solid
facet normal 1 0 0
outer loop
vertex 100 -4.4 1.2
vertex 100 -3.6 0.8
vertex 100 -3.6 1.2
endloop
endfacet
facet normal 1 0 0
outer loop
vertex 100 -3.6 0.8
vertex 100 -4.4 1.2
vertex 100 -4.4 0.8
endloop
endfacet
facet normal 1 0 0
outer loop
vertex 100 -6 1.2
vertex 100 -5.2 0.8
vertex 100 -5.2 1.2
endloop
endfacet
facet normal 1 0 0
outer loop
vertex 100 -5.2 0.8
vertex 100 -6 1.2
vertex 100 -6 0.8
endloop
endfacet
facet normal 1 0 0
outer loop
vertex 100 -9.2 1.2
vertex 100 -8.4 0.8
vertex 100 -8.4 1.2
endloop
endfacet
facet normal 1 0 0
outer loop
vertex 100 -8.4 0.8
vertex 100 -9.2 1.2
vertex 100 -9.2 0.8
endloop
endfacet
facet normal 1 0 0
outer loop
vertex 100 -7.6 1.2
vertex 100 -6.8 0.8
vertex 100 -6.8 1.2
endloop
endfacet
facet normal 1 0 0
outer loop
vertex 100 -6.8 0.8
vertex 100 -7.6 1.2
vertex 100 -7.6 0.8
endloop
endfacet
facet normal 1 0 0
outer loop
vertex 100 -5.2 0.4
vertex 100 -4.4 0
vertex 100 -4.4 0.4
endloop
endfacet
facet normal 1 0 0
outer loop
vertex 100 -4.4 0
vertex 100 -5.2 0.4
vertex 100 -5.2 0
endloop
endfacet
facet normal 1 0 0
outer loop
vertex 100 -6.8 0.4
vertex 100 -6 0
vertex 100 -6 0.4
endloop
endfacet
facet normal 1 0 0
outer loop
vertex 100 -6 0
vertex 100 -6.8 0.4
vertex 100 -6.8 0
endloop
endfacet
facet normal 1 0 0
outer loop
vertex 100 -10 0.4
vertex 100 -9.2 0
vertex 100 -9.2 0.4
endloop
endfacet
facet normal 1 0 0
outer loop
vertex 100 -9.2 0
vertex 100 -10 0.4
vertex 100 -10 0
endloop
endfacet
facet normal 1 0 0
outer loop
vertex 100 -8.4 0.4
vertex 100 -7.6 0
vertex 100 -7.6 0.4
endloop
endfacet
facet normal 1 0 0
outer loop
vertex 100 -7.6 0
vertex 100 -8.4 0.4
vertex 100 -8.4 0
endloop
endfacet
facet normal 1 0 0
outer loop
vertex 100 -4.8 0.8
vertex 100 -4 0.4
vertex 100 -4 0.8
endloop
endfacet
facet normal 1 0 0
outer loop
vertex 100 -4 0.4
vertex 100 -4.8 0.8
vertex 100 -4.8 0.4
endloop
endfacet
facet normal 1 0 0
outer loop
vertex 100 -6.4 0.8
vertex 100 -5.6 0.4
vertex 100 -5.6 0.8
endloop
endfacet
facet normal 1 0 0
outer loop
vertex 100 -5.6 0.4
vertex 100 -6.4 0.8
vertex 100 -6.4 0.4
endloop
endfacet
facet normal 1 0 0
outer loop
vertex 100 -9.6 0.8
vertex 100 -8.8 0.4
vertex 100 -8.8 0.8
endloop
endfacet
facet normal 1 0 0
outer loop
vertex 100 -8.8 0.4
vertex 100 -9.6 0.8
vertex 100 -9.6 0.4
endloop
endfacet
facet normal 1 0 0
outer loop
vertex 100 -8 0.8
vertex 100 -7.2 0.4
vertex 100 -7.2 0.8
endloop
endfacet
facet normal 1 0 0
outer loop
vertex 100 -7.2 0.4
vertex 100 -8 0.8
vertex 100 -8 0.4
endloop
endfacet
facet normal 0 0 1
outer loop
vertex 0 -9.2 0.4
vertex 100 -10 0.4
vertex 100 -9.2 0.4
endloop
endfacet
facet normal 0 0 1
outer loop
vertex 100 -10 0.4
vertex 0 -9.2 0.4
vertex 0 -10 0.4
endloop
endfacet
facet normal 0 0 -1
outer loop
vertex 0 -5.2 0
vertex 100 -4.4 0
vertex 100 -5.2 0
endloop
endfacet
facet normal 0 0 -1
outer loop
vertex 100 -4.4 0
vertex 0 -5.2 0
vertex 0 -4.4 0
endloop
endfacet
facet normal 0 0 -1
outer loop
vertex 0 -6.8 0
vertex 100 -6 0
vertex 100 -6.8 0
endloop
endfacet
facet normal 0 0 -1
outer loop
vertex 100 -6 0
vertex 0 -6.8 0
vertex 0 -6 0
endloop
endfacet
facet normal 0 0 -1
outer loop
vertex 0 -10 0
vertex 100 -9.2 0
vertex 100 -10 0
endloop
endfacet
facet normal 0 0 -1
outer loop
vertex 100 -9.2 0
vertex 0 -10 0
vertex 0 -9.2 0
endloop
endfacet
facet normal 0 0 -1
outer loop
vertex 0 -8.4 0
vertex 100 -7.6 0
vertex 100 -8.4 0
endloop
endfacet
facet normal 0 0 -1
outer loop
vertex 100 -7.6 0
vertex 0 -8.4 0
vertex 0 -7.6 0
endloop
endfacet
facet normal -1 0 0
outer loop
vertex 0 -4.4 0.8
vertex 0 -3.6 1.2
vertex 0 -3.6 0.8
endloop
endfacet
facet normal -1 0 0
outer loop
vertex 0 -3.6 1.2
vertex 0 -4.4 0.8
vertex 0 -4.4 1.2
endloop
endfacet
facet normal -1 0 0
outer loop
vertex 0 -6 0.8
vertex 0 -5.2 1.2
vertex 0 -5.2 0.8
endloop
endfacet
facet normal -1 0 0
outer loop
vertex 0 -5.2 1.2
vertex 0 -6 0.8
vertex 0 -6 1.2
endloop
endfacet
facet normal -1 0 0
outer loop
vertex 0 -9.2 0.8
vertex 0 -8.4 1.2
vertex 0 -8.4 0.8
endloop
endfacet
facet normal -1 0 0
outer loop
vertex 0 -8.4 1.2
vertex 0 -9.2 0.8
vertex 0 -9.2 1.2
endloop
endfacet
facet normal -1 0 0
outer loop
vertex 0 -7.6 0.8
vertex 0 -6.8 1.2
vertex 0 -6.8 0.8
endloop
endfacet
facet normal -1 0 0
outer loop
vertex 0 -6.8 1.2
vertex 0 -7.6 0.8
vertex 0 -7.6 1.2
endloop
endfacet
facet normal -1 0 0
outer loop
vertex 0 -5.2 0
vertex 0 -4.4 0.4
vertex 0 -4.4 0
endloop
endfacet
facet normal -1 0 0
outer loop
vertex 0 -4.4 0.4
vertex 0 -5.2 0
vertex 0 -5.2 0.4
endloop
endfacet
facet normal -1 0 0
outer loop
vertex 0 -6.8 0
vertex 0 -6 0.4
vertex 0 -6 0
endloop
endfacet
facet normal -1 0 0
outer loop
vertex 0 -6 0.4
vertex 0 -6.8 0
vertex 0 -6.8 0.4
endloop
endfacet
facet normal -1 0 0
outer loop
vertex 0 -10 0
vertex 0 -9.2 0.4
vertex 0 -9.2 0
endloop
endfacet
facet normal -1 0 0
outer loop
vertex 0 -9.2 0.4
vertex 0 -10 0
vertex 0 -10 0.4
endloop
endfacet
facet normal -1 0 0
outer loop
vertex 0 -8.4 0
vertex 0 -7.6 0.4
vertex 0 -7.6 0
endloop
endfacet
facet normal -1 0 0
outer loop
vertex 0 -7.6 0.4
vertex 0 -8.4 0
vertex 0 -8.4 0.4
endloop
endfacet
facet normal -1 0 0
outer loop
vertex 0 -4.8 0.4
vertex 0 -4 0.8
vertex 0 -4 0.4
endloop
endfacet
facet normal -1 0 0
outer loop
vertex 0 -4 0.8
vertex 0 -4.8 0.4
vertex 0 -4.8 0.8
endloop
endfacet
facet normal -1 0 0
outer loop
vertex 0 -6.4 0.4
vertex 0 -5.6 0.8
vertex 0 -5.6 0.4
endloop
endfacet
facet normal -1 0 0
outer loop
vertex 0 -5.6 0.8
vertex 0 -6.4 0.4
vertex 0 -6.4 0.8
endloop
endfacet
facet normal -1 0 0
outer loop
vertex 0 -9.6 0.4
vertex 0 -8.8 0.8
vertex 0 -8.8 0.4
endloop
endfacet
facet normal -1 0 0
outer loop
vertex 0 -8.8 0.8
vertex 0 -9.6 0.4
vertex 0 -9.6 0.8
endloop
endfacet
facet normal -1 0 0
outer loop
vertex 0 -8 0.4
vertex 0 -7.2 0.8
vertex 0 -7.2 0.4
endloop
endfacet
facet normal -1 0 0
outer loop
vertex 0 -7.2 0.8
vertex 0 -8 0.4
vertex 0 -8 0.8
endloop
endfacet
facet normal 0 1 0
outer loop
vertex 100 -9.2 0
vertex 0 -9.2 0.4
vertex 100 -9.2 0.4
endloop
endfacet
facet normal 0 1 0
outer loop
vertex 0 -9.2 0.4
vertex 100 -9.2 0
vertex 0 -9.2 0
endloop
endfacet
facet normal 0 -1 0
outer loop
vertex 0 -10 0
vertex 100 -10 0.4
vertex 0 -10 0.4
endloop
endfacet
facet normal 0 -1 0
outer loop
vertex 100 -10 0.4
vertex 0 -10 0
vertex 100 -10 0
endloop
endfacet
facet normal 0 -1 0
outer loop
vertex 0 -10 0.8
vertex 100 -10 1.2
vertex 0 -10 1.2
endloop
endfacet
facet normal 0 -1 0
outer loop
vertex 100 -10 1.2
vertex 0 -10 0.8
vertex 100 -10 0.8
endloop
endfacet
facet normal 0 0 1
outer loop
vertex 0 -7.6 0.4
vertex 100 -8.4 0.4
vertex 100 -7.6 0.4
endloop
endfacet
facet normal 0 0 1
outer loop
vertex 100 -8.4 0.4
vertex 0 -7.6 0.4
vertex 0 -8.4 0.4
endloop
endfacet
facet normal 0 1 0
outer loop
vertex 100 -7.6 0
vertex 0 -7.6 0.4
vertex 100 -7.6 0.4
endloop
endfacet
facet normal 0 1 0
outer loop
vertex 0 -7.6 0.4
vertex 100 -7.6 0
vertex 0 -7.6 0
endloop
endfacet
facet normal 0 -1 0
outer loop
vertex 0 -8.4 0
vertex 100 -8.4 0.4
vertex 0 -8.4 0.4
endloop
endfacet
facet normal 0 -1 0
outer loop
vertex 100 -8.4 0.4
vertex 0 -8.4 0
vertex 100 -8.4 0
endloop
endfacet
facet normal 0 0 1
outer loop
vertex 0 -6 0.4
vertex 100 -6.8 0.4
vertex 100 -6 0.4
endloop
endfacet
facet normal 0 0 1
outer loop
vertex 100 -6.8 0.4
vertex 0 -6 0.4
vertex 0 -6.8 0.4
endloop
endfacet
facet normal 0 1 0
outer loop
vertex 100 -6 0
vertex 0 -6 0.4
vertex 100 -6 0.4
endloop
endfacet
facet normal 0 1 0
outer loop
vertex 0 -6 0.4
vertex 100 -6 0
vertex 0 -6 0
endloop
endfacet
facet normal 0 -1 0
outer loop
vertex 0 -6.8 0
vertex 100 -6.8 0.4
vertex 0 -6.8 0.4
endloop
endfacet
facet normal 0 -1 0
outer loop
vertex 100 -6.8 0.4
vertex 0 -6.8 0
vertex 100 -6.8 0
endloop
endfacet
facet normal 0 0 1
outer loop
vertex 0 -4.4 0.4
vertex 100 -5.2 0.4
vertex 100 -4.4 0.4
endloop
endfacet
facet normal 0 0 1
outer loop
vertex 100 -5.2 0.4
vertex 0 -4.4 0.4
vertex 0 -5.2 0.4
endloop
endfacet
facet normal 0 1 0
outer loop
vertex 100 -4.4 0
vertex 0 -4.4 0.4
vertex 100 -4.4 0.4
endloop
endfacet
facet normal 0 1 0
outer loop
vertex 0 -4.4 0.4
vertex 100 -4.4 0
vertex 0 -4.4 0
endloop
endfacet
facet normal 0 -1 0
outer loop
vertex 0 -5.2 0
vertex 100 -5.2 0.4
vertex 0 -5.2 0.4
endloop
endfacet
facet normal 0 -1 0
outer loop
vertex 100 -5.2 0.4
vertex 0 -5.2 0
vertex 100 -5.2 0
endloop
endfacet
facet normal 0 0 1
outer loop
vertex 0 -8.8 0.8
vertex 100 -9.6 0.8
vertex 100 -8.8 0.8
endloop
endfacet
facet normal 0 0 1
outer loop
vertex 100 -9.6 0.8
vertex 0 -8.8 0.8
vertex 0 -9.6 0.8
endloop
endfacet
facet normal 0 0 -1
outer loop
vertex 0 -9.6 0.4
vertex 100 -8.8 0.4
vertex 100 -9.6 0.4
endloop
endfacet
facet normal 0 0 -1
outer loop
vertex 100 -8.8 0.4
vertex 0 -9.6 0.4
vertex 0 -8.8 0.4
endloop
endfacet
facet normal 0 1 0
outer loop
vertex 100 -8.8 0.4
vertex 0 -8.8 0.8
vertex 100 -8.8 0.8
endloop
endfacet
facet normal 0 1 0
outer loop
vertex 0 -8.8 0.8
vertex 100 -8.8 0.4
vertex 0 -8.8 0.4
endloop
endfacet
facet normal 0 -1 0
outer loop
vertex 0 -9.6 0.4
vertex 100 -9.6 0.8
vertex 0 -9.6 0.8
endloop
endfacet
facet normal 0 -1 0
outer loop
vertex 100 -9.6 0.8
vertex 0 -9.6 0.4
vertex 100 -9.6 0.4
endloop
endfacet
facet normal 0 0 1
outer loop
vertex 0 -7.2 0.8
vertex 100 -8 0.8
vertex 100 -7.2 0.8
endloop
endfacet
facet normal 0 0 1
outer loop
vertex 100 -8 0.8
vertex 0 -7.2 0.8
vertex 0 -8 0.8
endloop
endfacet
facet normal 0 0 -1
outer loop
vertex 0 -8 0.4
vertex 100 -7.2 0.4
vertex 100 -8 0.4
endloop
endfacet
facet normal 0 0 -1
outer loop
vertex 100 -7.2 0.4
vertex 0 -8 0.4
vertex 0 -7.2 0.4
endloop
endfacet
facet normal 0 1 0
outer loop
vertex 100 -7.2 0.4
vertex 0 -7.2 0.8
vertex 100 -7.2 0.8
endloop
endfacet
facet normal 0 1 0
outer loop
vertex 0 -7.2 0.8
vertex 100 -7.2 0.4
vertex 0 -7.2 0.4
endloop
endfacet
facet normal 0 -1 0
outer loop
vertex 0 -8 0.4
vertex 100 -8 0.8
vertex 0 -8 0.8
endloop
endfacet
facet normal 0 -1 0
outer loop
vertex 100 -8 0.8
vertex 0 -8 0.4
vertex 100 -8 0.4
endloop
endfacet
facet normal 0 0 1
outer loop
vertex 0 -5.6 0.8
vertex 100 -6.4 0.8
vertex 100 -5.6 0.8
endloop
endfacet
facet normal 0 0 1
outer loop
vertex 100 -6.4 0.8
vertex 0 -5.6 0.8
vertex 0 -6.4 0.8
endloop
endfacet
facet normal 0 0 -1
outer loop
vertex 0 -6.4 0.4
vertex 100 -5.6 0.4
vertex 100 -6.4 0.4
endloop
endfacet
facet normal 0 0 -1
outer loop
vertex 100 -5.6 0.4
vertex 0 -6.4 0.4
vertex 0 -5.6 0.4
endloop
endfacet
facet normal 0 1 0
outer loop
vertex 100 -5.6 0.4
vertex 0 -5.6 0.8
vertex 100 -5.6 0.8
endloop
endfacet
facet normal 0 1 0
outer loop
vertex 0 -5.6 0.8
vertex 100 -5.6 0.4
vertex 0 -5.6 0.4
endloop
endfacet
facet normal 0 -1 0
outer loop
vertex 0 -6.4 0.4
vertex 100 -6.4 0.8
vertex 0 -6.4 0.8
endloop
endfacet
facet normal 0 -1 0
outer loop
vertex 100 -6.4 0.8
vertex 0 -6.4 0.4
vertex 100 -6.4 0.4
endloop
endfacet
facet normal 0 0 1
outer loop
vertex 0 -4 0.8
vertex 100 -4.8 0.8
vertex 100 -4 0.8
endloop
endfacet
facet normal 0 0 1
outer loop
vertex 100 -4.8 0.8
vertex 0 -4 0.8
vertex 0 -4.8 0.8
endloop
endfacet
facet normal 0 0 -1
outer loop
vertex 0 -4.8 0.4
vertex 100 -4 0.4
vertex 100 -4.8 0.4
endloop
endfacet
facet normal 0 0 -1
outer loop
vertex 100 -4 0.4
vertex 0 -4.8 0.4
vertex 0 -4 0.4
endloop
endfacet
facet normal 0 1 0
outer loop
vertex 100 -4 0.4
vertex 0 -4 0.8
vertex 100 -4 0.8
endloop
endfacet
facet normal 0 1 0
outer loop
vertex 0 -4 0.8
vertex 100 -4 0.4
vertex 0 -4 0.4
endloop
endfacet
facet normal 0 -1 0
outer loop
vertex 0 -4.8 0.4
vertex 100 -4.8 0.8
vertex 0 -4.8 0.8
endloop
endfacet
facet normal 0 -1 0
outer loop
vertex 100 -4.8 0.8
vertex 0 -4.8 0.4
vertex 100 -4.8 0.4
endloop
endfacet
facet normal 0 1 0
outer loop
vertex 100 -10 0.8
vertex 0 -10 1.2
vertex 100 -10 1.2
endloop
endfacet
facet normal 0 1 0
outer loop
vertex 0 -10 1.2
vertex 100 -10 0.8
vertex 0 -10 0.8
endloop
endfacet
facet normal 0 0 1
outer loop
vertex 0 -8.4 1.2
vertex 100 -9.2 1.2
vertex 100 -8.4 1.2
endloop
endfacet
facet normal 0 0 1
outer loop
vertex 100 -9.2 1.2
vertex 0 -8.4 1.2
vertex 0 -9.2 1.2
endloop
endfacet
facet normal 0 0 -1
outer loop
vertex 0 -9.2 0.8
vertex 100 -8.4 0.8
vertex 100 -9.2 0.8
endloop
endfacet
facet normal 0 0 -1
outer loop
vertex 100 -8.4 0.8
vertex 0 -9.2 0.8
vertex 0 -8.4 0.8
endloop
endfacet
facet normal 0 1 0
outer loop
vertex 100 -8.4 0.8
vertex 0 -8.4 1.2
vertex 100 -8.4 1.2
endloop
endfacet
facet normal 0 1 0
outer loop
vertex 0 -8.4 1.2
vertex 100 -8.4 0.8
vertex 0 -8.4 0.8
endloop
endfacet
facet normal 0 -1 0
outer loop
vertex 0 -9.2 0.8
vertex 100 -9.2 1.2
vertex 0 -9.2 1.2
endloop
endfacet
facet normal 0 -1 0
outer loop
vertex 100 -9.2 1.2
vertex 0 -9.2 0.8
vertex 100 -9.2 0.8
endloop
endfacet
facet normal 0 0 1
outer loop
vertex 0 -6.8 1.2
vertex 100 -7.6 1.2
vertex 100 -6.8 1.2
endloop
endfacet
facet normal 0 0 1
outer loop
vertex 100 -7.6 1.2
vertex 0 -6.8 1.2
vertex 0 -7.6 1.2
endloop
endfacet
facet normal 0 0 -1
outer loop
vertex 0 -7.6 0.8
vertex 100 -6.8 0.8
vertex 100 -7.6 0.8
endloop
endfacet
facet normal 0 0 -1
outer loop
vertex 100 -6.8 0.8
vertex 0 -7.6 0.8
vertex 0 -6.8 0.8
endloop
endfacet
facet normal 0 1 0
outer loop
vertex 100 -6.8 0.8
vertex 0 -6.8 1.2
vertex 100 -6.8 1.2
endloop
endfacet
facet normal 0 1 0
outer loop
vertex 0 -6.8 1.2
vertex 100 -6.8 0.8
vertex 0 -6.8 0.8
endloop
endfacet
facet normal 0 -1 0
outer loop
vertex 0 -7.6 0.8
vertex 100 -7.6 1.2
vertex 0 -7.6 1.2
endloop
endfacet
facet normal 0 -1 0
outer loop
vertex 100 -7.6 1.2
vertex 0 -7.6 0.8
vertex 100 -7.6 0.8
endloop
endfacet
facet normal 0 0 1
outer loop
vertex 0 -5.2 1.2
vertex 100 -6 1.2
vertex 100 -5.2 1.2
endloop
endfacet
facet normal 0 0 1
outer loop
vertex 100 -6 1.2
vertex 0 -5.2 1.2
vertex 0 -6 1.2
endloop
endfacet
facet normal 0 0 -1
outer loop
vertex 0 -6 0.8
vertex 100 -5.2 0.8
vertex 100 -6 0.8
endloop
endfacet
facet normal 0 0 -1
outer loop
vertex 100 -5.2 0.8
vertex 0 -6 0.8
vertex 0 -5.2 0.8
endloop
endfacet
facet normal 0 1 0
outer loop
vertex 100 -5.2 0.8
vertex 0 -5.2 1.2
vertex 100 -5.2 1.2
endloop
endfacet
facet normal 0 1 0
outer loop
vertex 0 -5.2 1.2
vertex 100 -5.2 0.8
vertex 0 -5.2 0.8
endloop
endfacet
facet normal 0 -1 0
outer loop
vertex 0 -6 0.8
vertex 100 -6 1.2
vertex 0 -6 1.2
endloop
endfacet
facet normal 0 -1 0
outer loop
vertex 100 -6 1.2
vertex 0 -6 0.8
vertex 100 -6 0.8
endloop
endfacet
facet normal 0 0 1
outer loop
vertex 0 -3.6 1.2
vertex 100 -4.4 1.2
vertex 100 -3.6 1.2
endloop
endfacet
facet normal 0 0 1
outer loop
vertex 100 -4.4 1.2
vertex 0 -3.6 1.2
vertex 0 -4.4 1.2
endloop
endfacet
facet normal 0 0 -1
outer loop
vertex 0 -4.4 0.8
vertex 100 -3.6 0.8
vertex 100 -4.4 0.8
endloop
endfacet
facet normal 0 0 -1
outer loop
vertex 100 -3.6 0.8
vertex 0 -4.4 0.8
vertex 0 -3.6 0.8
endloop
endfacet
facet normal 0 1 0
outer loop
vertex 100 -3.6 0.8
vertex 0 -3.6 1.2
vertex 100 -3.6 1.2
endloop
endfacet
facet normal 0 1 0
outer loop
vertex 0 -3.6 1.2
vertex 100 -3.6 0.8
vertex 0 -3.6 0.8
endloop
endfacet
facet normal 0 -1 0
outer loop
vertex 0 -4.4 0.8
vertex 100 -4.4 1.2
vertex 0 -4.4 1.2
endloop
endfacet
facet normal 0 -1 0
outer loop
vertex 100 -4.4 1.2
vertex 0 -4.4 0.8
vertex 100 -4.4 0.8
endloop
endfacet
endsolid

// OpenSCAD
length = 100;
extrusion = 0.4;
layer = 0.2;
width_rep = 16;
width = width_rep*extrusion;

//print_material = ["RED", "GREEN"];
print_material = ["RED"];
//print_material = ["GREEN"];

//translate([0, 10, 0]) single_material();
//translate([0, 0, 0])  multi_material_layered();
translate([0, -10, 0]) multi_material_mixed();

module single_material () {
  if (should_print("RED"))
    color("red")
    cube([length, width, 3*extrusion]);
}

module multi_material_layered() {
  if (should_print("RED"))
    color("red") 
    for (i=[0:2:2])
      translate([0, 0, i*extrusion])
      cube([length, width, extrusion]);
  
  if (should_print("GREEN"))
    color("green")
    translate([0, 0, extrusion])
    cube([length, width, extrusion]);
}

module multi_material_mixed () {
  intersection () {
    for (z=[1:3])
      translate([0, (z-1)*extrusion, (z-1)*extrusion])
      for (y=[0:width_rep/4])
        translate([0, (y-1)*4*extrusion, 0]) {
          if (should_print("RED"))
            color("RED")
            cube([length, 2*extrusion, extrusion]);
          if (should_print("GREEN"))
            color("GREEN")
            translate([0, 2*extrusion, 0])
            cube([length, 2*extrusion, extrusion]);    
        }
        
    cube([length, width, 3*extrusion]);    
  }
}

function should_print(part) =
  (search([part], print_material) != [[]]);
